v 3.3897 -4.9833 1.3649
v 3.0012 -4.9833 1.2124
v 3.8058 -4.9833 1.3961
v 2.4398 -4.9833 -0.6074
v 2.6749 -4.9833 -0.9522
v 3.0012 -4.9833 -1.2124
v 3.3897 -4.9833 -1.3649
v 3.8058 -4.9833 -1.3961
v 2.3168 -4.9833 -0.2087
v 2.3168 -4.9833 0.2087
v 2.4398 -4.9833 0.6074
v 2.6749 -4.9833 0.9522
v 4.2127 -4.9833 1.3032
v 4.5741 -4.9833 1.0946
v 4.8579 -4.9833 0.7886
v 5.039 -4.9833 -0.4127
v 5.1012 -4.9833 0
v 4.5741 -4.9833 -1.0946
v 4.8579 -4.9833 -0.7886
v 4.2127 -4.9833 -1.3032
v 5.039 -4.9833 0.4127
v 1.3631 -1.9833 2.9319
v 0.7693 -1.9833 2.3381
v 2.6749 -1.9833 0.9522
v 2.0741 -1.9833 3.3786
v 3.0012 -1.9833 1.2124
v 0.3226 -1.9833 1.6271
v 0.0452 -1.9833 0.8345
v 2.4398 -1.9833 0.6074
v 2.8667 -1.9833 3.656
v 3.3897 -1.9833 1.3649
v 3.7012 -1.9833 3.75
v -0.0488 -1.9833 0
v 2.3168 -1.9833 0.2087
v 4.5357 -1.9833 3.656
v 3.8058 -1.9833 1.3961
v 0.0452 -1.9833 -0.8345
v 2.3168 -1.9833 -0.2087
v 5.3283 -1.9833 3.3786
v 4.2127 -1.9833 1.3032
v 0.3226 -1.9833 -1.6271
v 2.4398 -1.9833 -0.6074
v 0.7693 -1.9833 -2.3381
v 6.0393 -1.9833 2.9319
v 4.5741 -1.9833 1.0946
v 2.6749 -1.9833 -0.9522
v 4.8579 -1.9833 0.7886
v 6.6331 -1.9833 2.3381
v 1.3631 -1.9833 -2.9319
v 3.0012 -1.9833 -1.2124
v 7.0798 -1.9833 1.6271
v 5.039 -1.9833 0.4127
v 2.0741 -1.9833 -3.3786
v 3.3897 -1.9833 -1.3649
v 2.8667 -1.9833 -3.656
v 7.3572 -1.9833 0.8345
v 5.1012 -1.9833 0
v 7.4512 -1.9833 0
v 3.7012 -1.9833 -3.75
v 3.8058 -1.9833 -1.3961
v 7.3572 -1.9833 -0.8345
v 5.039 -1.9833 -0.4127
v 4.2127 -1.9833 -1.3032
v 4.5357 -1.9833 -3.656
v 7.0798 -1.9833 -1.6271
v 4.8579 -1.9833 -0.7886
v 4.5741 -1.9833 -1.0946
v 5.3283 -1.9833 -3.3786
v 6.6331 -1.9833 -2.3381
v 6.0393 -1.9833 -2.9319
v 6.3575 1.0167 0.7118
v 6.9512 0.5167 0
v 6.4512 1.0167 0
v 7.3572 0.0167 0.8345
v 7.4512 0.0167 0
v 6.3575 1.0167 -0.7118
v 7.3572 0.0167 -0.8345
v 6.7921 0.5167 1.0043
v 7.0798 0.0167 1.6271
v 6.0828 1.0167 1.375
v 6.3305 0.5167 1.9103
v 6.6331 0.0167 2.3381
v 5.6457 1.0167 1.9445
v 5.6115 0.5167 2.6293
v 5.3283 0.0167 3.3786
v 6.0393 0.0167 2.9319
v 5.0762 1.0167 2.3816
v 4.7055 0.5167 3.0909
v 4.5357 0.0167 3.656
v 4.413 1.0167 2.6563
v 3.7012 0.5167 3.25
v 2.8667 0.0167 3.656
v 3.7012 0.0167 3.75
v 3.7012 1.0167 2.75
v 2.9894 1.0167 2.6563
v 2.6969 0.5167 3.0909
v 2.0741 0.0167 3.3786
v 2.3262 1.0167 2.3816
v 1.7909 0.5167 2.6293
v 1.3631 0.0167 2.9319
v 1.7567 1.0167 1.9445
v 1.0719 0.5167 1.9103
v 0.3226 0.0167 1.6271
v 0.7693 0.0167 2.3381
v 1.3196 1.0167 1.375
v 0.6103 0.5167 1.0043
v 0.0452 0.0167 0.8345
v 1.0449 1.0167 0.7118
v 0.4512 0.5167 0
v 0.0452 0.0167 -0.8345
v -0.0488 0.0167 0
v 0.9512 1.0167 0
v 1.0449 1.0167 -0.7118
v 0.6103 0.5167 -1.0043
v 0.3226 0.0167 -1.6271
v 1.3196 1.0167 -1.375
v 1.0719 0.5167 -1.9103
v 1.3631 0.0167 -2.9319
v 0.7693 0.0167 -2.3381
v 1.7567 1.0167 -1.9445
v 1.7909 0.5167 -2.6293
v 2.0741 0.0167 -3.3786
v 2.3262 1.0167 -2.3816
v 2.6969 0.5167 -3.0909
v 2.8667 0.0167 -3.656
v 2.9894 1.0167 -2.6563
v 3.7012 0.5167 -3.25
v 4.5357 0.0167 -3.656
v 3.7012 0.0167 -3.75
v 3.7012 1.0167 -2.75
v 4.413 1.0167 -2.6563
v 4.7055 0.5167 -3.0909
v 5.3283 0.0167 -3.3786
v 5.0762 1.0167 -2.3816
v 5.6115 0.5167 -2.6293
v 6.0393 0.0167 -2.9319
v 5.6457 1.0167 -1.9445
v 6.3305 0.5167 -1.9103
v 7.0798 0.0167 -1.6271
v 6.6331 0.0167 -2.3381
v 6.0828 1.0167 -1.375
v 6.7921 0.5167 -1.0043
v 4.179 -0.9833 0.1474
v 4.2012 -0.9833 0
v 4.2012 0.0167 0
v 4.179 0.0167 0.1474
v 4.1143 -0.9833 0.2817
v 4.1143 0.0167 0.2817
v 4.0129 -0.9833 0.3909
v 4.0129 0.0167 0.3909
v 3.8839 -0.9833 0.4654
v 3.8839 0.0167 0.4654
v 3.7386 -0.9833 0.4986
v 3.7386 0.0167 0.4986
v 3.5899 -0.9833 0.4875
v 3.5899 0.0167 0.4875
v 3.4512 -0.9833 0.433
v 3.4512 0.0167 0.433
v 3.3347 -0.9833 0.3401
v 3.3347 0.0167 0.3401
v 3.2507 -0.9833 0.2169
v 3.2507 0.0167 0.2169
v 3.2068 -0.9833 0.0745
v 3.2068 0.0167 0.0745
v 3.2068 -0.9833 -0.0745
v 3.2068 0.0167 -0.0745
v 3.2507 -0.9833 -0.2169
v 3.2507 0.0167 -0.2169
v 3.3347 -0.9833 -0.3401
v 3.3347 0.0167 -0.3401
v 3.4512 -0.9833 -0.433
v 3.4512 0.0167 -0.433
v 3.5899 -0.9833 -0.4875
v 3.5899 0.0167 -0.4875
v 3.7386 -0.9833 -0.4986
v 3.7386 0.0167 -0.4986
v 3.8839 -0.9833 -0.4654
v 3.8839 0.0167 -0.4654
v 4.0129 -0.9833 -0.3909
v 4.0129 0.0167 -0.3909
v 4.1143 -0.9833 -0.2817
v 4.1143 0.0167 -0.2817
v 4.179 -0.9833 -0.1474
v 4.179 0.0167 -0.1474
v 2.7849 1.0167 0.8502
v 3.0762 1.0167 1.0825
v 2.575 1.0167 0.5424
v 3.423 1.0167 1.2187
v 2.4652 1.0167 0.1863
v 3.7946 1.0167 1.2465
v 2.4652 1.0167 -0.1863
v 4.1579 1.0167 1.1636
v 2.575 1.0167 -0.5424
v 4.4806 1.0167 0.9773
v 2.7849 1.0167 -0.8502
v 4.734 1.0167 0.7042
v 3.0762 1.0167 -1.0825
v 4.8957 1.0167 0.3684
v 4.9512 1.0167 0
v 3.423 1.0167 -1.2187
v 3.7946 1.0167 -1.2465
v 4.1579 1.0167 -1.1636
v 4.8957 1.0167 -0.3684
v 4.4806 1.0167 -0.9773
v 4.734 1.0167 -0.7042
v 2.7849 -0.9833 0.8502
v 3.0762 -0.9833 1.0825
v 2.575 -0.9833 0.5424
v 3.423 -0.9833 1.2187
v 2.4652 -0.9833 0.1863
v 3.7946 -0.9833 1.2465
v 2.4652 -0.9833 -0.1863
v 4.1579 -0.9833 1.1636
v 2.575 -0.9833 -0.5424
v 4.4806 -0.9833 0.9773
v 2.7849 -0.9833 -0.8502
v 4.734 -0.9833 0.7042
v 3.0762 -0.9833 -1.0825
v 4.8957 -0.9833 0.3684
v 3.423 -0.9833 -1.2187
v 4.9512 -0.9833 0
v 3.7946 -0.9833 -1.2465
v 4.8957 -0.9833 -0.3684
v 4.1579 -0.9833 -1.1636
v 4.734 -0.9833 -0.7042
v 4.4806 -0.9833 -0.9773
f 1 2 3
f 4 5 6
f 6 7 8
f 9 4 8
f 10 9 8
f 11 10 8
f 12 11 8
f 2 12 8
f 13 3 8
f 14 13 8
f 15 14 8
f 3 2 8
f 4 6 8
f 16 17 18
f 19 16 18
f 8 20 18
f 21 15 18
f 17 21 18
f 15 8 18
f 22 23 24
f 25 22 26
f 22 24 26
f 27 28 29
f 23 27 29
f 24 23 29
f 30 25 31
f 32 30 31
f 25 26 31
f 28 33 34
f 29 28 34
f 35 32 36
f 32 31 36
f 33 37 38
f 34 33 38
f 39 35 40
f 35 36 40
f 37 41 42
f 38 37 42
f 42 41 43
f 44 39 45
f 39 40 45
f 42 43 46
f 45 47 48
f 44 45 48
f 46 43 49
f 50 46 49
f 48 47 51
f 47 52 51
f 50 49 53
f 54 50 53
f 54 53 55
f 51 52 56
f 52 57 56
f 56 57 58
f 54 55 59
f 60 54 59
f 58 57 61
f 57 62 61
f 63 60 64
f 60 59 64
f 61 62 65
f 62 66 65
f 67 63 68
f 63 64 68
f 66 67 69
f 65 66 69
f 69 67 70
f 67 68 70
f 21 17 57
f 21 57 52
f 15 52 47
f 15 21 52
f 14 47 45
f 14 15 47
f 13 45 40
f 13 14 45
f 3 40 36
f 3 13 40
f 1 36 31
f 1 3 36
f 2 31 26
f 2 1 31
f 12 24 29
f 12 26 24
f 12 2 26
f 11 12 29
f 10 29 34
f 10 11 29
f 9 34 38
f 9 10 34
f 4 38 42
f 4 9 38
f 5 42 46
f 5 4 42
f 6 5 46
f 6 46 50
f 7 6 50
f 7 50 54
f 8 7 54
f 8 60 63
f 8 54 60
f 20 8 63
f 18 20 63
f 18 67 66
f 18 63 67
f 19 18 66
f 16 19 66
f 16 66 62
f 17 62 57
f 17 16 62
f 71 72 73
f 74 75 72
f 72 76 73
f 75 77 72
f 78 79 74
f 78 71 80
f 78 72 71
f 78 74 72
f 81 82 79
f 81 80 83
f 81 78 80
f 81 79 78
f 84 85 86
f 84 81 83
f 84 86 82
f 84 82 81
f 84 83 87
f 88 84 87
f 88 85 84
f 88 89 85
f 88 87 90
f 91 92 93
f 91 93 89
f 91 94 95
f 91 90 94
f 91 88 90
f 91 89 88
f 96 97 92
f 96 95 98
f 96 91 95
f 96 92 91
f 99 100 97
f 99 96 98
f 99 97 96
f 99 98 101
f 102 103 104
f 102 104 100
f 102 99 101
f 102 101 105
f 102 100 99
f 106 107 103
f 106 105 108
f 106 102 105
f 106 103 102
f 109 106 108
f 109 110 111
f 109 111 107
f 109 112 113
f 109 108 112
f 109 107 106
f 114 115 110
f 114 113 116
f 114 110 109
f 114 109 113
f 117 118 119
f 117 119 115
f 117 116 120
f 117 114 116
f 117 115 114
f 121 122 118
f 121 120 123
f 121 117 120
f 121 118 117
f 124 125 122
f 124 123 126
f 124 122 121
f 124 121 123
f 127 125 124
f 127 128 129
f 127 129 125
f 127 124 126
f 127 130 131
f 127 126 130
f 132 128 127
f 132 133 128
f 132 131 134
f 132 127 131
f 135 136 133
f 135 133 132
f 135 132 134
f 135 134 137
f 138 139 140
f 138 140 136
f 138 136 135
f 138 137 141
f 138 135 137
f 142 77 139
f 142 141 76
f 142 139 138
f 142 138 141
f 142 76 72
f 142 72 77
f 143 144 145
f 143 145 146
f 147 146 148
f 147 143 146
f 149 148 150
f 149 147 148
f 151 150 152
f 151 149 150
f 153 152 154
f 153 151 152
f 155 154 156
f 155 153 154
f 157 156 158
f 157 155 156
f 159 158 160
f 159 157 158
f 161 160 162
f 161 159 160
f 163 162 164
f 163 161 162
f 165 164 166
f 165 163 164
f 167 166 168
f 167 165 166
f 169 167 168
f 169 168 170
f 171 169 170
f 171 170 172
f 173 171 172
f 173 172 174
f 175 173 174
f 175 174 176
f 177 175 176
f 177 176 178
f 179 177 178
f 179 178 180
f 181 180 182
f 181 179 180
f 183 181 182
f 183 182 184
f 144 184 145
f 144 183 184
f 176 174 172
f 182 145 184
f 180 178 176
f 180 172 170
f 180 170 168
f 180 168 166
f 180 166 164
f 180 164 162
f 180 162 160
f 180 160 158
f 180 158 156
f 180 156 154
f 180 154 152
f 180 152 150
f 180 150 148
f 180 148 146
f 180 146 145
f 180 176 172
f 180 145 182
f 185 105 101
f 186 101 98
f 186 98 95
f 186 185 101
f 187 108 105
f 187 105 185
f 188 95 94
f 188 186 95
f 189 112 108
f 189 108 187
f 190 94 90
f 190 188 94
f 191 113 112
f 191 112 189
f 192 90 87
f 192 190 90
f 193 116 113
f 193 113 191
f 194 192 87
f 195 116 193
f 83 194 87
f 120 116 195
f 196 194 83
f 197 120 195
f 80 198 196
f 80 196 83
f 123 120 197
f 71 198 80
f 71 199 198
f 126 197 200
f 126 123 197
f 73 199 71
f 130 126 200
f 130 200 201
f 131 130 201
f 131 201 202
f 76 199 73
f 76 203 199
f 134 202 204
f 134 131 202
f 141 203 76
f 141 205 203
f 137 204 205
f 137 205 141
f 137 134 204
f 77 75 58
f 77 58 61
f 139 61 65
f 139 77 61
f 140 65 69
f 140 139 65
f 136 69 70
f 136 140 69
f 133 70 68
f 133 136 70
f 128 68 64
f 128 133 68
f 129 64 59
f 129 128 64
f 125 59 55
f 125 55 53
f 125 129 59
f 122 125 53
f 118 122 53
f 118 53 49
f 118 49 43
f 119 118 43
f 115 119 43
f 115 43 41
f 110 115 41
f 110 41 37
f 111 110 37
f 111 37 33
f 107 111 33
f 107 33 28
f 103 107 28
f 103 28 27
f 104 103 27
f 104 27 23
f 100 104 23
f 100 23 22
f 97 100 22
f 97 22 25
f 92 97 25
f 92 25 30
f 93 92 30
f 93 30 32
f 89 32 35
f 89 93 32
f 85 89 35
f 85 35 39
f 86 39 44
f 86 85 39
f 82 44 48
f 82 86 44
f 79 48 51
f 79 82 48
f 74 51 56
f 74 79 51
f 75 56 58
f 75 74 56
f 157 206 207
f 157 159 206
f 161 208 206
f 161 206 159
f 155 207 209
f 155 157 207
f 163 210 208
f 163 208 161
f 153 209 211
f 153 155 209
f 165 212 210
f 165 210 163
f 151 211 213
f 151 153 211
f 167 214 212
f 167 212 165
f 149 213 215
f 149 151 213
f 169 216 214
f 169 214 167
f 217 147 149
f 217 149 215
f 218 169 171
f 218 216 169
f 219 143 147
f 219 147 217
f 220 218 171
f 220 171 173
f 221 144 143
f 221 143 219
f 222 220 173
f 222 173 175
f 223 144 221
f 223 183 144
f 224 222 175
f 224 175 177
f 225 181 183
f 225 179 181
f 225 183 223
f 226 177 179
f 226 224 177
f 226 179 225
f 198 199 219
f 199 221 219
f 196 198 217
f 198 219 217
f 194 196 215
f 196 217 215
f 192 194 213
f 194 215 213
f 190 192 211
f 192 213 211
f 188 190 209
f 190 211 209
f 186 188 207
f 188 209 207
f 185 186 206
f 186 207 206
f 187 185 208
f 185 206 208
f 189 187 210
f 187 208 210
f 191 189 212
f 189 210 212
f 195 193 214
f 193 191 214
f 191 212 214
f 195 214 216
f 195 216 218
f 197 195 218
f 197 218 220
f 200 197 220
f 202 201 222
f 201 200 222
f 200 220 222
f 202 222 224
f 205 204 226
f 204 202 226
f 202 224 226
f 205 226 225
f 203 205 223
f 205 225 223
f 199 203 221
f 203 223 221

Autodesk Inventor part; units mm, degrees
ref_plane "YZ Plane" through (0, 0, 0) normal (1, 0, 0) x (0, 1, 0)
ref_plane "XZ Plane" through (0, 0, 0) normal (0, 1, 0) x (-1, 0, 0)
ref_plane "XY Plane" through (0, 0, 0) normal (0, 0, 1) x (1, 0, 0)
sketch "Sketch1" plane through (0, 0, 0) normal (0, 0, 1) x (1, 0, 0)
  line L0 (5.1012, -1.9833) -> (5.1012, -4.9833)
  line L1 (7.4512, -1.9833) -> (7.4512, 0.0167)
  line L2 (4.9512, 1.0167) -> (4.9512, -0.9833)
  line L3 (4.2012, 0.0167) -> (4.2012, -0.9833)
  line L4 (4.9512, 1.0167) -> (6.4512, 1.0167)
  line L5 (7.4512, -1.9833) -> (5.1012, -1.9833)
  line L6 (5.1012, -4.9833) -> (3.7012, -4.9833)
  line L7 (3.7012, -4.9833) -> (3.7012, 0.0167)
  line L8 (4.2012, -0.9833) -> (4.9512, -0.9833)
  line L9 (6.4512, 1.0167) -> (7.4512, 0.0167)
  line L10 (3.7012, 0.0167) -> (4.2012, 0.0167)
revolve "Revolution1" add sketch "Sketch1" angle 360 about axis through (3.7012, -4.9833, 0) along (0, 1, 0)
properties part number "MUSAB5" material "Bronze, Soft Tin"
